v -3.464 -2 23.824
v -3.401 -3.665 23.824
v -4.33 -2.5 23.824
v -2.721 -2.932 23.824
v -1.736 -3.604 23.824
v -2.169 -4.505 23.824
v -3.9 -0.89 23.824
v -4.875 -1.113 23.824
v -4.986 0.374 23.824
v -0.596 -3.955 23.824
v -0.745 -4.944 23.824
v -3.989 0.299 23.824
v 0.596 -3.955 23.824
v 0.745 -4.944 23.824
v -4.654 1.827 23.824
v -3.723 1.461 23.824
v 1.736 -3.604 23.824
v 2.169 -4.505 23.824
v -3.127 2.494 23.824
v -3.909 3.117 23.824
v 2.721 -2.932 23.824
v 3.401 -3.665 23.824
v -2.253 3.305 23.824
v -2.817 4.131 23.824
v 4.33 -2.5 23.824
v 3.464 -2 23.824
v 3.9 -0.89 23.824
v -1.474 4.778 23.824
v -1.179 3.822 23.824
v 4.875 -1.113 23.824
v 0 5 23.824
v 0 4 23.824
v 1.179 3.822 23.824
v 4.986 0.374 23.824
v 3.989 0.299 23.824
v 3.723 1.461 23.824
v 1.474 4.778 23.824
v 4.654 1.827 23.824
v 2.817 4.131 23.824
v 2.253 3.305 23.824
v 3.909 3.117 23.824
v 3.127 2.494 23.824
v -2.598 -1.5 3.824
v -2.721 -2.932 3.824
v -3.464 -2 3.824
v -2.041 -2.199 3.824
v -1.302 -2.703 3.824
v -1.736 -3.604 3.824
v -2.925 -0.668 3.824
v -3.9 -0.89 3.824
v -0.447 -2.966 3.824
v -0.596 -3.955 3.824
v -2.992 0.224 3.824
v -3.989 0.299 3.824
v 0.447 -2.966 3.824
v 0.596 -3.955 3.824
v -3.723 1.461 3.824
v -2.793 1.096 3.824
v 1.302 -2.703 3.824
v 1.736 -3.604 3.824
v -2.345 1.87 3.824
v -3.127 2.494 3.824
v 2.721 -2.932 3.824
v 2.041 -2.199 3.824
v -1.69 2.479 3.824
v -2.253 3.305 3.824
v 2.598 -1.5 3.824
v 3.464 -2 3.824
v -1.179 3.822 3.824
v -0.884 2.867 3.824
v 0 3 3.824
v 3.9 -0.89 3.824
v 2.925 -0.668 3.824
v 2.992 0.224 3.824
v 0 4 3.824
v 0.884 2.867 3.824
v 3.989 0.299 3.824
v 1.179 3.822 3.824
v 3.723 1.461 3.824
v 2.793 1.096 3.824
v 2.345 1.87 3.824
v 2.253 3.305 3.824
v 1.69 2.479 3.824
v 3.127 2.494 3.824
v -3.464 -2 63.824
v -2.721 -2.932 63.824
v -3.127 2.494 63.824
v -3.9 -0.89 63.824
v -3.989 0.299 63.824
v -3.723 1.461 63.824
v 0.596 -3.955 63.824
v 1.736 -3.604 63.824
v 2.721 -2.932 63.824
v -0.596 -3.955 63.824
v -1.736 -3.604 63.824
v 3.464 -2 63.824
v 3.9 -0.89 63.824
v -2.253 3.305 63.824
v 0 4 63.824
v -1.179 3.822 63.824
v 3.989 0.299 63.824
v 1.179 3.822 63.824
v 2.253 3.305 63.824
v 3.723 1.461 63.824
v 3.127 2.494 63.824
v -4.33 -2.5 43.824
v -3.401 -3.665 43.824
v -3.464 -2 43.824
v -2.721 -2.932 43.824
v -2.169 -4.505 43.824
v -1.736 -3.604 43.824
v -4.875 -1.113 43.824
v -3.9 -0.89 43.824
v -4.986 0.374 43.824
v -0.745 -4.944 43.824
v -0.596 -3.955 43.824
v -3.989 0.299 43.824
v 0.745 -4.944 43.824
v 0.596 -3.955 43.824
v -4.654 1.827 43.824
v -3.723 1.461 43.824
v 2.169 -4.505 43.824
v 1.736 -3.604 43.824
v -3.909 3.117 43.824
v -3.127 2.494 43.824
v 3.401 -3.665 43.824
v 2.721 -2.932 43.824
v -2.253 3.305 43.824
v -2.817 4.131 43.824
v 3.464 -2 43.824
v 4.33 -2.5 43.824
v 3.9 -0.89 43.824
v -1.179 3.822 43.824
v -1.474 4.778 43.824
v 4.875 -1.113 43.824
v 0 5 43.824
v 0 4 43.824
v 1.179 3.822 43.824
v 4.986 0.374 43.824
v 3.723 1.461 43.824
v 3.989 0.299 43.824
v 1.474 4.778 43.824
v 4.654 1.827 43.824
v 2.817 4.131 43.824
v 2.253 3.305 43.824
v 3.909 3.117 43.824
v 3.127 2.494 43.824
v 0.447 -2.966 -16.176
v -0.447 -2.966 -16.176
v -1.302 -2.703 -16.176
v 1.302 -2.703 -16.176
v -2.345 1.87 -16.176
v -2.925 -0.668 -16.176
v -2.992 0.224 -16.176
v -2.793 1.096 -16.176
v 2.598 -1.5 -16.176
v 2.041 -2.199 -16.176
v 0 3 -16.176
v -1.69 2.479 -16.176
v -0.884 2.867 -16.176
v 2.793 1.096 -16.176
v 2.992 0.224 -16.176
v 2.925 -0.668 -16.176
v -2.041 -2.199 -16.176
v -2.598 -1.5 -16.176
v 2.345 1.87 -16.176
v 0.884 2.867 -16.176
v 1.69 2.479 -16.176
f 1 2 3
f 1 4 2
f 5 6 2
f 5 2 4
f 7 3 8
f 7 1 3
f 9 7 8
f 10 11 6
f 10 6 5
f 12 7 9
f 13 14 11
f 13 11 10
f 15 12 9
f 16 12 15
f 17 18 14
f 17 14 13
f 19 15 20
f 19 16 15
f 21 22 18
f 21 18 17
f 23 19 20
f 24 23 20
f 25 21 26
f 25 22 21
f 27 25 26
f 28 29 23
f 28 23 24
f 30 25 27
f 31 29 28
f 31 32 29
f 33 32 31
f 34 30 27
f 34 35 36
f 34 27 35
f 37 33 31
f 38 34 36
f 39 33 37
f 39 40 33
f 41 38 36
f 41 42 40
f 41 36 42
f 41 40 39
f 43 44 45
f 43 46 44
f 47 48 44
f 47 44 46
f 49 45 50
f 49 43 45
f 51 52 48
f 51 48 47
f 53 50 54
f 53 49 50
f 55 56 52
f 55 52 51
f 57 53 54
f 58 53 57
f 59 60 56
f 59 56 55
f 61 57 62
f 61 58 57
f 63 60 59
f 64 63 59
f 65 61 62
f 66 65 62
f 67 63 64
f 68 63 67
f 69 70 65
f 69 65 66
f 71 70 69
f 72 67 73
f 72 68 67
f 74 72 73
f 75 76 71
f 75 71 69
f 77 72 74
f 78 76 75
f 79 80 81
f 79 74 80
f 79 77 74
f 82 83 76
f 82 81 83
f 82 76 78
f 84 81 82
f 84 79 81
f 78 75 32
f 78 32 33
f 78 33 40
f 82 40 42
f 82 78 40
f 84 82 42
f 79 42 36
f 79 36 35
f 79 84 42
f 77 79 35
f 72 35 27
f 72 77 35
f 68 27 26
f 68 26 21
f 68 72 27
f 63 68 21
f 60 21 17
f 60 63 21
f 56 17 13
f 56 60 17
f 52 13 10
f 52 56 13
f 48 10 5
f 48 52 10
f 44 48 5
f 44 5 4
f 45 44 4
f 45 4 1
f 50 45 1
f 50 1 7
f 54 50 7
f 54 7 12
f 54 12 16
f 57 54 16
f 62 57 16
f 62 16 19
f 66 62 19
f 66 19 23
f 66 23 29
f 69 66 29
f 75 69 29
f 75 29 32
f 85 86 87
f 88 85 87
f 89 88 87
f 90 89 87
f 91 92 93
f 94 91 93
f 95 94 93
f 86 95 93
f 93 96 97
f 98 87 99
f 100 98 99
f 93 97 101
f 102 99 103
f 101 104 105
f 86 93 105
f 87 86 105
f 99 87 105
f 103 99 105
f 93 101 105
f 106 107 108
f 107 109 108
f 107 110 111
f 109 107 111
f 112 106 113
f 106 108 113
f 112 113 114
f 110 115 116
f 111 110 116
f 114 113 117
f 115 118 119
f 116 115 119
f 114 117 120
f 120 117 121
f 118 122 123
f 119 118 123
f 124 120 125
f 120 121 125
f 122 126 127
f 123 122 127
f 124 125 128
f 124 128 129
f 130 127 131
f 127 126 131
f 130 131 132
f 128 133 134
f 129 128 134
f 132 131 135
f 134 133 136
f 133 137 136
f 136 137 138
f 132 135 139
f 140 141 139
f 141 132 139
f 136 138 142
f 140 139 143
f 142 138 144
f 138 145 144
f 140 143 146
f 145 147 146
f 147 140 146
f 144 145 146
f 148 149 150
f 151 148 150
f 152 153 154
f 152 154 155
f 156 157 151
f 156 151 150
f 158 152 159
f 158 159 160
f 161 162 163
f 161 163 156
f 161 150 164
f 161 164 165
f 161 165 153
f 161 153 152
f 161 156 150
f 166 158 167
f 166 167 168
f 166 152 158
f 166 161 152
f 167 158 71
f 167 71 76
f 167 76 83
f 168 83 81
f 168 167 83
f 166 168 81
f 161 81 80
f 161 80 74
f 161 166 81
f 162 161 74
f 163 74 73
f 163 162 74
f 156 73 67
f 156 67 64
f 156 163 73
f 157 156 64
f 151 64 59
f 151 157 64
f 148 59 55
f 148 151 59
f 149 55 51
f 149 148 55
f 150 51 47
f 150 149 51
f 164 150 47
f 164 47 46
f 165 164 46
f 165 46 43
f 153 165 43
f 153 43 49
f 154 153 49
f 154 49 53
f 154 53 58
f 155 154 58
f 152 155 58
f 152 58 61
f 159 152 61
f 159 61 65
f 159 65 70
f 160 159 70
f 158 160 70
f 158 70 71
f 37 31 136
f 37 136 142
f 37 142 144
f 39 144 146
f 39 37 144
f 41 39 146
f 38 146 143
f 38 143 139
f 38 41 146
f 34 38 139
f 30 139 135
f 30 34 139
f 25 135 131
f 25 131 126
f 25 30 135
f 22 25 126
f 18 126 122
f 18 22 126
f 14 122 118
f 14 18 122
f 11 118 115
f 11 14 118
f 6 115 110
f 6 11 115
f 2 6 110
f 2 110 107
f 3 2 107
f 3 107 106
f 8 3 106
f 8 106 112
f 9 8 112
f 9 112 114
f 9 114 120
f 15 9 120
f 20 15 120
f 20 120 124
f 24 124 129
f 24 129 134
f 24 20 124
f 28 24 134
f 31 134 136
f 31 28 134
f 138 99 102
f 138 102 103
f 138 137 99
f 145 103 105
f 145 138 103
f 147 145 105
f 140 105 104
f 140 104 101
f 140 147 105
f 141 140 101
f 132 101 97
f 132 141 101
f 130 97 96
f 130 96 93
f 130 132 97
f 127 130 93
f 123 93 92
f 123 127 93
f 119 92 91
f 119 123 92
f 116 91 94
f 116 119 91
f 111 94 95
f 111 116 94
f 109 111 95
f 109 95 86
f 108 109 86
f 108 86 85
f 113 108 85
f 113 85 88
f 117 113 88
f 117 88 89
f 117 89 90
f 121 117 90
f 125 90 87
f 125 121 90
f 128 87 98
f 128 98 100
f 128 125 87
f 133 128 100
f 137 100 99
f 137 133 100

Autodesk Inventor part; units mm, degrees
ref_plane "YZ Plane" through (0, 0, 0) normal (1, 0, 0) x (0, 1, 0)
ref_plane "XZ Plane" through (0, 0, 0) normal (0, 1, 0) x (-1, 0, 0)
ref_plane "XY Plane" through (0, 0, 0) normal (0, 0, 1) x (1, 0, 0)
sketch "Sketch1" plane through (0, 0, 0) normal (1, 0, 0) x (0, 1, 0)
  line L0 (0, -32.1759) -> (0, 79.8241) construction
  line L1 (0, 63.8241) -> (4, 63.8241)
  line L2 (4, 63.8241) -> (4, 43.8241)
  line L3 (4, 43.8241) -> (5, 43.8241)
  line L4 (5, 43.8241) -> (5, 23.8241)
  line L5 (5, 23.8241) -> (4, 23.8241)
  line L6 (4, 23.8241) -> (4, 3.8241)
  line L7 (4, 3.8241) -> (3, 3.8241)
  line L8 (3, 3.8241) -> (3, -16.1759)
  line L9 (3, -16.1759) -> (0, -16.1759)
  line L10 (0, 63.8241) -> (0, -16.1759)
  point P0 (0, 0)
  dimension "d0" = 3
  dimension "d1" = 80
  dimension "d2" = 60
  dimension "d3" = 20
  dimension "d4" = 4
  dimension "d5" = 5
revolve "Revolution1" add sketch "Sketch1" angle 360 about axis through (0, 0, 63.8241) along (0, 0, -1)
properties part number "02_Truc_01"
